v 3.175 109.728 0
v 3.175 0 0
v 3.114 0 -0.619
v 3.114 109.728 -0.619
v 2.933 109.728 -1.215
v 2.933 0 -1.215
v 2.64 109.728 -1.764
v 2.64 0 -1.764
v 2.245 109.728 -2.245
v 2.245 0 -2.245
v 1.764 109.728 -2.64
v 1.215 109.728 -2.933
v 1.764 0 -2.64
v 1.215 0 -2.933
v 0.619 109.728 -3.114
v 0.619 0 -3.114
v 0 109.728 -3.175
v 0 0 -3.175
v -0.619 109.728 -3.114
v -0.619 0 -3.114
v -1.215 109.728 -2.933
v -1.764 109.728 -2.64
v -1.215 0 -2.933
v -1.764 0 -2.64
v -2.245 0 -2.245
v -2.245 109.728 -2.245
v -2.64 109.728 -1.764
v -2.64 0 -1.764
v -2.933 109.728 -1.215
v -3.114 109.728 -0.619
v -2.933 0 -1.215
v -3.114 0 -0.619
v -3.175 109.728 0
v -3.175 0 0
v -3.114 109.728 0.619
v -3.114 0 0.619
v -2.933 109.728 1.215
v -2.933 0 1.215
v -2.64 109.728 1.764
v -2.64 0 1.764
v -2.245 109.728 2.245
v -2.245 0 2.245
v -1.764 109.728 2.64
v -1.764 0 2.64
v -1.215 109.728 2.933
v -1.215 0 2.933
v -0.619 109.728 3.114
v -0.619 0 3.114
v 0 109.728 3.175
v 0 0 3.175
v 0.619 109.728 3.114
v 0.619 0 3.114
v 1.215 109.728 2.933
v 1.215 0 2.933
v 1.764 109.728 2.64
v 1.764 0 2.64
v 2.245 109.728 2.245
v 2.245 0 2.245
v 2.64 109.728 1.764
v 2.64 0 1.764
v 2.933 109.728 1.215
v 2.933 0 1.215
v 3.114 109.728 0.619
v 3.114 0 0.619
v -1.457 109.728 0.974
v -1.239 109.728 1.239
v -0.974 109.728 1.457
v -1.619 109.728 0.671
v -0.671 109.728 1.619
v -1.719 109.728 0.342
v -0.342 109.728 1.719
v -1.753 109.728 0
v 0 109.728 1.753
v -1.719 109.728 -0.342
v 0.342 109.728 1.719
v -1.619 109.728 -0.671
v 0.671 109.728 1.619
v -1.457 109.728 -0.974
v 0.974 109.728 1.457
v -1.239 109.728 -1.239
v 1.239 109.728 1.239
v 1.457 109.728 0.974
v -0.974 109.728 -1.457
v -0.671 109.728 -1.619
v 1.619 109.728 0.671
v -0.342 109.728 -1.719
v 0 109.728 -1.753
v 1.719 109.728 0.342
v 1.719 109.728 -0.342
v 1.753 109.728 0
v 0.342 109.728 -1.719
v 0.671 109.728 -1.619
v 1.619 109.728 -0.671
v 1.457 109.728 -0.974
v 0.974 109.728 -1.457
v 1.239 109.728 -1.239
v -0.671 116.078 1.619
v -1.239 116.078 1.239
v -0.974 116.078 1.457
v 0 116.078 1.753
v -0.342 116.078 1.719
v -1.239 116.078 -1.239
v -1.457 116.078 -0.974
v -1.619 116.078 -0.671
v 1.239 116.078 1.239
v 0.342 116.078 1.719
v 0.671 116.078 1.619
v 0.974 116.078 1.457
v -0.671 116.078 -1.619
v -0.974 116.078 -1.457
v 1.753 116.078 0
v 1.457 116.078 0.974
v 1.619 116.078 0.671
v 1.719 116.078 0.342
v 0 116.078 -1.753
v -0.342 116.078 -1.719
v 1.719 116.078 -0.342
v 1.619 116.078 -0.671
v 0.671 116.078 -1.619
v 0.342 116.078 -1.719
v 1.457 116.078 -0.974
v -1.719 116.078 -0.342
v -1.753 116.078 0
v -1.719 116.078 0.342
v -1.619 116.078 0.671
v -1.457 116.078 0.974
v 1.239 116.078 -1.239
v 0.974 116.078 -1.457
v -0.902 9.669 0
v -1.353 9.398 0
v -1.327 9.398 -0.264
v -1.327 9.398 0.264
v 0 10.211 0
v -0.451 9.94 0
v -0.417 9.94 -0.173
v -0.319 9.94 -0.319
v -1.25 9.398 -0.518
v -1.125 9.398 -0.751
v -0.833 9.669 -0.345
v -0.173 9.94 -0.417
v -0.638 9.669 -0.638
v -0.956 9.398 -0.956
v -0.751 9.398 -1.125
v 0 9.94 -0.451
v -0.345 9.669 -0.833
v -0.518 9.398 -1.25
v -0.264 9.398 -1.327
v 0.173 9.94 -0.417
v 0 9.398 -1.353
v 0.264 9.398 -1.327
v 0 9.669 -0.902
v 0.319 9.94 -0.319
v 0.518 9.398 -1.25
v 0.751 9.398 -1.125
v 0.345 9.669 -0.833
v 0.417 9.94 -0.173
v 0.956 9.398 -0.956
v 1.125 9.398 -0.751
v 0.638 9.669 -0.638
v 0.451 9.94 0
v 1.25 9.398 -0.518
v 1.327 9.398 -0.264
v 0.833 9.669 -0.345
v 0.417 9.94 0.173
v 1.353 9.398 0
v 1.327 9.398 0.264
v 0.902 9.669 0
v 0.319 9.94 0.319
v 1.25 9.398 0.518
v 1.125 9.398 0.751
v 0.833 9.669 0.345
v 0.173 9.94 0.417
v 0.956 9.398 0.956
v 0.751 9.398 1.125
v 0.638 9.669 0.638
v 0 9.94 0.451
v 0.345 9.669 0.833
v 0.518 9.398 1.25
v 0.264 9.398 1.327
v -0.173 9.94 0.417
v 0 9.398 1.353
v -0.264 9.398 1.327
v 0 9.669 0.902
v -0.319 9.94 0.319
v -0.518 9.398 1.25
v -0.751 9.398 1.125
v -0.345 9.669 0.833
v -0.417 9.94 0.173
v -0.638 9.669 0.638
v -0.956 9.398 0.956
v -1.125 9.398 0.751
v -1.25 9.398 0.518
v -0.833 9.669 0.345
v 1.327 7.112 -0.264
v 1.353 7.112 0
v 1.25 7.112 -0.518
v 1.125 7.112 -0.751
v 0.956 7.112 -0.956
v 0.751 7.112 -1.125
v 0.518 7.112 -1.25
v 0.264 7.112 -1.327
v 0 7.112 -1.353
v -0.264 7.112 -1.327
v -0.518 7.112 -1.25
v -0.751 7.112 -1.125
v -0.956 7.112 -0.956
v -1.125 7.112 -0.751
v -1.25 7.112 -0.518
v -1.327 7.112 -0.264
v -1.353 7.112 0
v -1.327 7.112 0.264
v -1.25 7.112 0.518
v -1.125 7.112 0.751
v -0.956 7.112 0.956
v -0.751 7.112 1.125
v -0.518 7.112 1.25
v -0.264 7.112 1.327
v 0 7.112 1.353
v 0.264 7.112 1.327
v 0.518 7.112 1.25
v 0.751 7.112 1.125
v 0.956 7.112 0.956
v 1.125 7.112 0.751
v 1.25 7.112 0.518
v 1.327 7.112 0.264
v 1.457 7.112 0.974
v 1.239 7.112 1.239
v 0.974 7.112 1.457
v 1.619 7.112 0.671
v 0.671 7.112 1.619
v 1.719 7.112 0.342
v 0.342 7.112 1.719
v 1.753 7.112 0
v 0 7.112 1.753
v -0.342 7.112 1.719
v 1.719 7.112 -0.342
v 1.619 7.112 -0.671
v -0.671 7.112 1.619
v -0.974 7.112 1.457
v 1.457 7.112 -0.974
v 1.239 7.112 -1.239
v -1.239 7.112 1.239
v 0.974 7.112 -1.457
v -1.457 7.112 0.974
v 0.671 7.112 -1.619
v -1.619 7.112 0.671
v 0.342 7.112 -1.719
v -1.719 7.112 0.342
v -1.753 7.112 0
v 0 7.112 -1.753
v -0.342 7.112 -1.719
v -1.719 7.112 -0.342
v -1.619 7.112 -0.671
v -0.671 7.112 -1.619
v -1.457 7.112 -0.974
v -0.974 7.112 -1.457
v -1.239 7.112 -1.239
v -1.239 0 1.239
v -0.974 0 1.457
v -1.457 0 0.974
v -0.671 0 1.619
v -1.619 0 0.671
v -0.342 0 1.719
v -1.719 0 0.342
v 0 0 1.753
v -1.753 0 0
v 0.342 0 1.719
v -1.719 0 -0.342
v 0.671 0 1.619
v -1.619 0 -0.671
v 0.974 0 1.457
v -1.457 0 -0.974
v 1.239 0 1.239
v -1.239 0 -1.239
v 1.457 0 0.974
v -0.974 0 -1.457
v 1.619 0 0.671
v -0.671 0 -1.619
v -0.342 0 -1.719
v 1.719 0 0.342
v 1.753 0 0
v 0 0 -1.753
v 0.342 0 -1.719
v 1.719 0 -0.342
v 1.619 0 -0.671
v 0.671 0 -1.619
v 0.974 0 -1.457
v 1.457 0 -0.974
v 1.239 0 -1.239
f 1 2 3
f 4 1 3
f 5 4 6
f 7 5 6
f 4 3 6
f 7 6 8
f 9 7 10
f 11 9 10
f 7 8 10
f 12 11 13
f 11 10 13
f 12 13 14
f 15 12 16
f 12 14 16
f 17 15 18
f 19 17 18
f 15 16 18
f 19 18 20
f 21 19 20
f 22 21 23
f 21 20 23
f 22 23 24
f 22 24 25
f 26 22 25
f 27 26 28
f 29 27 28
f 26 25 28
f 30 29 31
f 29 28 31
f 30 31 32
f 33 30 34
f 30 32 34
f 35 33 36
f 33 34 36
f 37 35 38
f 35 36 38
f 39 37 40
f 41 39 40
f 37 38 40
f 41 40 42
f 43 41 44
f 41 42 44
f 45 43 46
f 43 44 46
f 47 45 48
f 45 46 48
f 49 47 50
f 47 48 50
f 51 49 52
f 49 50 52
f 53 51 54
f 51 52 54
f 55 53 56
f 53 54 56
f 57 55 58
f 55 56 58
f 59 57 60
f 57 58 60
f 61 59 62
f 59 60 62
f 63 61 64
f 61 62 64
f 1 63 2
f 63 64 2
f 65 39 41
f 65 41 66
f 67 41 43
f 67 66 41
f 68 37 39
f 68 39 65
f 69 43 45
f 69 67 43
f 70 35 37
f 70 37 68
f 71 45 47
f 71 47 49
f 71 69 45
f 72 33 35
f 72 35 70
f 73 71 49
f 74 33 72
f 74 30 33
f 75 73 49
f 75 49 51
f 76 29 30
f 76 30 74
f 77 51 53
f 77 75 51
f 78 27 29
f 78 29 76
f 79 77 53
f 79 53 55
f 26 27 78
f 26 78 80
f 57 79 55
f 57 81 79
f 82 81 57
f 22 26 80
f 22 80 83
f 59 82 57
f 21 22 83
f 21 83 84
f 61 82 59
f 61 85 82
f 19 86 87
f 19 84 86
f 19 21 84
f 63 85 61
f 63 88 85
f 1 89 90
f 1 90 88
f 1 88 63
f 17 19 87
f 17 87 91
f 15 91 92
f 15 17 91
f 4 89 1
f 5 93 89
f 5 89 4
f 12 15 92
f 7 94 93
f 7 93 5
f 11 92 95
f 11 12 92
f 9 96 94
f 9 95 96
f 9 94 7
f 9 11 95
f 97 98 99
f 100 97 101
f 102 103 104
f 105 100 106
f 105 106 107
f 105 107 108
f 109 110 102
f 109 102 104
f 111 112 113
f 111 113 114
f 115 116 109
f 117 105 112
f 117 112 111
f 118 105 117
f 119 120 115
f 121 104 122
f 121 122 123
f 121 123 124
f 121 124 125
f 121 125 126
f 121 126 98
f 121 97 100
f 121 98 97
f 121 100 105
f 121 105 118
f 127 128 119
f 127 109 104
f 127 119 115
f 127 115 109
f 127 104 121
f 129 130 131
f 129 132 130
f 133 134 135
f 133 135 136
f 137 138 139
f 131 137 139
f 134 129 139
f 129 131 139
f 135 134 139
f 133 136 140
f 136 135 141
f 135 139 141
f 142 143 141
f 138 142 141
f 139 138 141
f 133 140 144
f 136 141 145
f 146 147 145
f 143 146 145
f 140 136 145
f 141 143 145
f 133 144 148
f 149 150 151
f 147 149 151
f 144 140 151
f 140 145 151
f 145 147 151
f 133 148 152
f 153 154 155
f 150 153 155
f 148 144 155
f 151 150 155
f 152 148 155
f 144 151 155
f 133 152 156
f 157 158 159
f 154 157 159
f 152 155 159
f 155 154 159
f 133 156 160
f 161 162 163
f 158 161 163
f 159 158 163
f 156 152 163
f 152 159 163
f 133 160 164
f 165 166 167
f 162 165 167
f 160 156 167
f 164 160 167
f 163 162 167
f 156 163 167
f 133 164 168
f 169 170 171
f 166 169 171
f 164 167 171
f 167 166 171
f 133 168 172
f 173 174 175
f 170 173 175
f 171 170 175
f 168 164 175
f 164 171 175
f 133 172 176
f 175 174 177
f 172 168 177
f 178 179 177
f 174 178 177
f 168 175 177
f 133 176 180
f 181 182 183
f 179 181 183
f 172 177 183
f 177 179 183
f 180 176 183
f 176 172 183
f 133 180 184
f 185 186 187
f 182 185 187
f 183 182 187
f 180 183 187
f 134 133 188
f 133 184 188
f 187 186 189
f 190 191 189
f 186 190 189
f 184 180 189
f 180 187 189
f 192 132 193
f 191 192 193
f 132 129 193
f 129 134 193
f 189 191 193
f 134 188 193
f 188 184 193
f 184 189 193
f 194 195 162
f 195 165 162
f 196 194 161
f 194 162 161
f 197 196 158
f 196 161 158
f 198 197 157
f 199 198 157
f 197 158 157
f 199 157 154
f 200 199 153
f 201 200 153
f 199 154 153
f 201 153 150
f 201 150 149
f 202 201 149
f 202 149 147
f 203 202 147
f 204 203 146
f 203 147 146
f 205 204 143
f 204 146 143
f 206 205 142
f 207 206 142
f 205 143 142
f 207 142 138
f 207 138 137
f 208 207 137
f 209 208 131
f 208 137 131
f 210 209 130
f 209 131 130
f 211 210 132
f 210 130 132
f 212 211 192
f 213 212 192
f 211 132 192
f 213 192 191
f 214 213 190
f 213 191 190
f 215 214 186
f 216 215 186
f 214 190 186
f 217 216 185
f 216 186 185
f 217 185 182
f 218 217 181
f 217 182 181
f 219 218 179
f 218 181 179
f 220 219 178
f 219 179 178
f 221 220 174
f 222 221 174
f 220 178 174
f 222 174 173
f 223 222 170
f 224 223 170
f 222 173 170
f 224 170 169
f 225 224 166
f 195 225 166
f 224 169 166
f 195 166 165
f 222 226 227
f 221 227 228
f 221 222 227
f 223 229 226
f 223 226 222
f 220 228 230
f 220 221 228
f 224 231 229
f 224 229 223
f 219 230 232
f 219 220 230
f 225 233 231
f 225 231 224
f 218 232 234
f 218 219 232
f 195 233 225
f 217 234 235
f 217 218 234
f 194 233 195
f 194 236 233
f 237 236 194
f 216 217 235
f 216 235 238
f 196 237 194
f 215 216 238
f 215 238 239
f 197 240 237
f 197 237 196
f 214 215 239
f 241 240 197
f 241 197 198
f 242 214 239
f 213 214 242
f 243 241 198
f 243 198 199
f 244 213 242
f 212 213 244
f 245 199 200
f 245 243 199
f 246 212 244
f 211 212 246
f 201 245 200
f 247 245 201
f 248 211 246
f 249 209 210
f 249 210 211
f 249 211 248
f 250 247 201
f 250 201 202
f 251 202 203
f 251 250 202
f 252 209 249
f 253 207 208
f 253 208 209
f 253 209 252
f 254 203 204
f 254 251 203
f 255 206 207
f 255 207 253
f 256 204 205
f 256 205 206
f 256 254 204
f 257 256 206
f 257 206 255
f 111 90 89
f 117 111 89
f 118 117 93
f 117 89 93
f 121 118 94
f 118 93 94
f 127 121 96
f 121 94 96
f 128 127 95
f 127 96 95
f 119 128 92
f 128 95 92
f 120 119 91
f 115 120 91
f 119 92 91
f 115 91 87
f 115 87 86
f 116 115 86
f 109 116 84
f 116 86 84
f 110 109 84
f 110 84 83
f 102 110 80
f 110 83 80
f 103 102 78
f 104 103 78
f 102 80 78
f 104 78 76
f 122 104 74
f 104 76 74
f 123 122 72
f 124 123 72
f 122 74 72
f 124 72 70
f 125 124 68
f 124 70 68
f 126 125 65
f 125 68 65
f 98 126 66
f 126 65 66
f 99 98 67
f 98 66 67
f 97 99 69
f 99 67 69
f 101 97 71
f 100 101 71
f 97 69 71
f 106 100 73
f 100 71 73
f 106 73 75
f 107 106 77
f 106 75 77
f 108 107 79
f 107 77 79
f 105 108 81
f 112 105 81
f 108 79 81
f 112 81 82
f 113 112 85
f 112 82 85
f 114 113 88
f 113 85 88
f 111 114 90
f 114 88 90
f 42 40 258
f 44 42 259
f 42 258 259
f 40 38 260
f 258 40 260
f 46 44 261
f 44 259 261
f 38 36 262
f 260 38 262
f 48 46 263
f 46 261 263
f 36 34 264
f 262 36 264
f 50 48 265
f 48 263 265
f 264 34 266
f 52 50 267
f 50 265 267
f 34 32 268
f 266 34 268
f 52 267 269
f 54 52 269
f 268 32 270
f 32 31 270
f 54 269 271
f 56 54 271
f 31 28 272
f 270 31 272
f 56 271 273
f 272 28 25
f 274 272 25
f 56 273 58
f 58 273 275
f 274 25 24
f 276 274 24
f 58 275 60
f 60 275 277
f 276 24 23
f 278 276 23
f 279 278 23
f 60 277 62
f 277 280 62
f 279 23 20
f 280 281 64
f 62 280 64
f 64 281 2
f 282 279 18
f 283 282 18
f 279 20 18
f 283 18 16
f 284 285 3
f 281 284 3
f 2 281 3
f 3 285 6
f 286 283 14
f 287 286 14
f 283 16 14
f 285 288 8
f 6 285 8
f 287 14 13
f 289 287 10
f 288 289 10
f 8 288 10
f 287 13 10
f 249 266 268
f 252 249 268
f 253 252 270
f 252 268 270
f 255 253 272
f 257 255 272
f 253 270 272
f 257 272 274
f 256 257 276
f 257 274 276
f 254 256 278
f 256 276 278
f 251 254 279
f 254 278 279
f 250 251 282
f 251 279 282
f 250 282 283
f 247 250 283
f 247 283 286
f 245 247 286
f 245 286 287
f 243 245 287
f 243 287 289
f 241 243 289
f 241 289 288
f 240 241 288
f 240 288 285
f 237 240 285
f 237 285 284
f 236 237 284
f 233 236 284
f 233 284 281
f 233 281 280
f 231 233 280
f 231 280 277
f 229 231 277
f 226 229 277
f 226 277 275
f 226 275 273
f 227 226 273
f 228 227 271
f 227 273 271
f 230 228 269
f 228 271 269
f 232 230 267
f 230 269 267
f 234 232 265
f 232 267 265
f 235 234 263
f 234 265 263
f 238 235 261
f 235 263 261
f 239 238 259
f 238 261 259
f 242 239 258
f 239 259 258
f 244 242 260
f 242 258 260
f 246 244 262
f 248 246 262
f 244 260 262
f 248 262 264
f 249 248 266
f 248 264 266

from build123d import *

# Parameters (mm, degrees)
SKETCH1_R                       = 3.175
BOSS_EXTRUDE1_DEPTH             = 109.728
F_6_32_TAPPED_HOLE1_D           = 2.7051
F_6_32_TAPPED_HOLE1_DEPTH       = 9.398
F_6_32_TAPPED_HOLE1_CBORE_D     = 3.5052
F_6_32_TAPPED_HOLE1_CBORE_DEPTH = 7.112
F_6_32_TAPPED_HOLE1_TIP         = 0.81269403
SKETCH4_R                       = 1.7526
BOSS_EXTRUDE2_DEPTH             = 6.35


with BuildPart() as part:
    # Sketch1 → Boss-Extrude1 (new body)
    with BuildSketch(Plane(origin=(0, 0, 0), x_dir=(1, 0, 0), z_dir=(0, 1, 0))):
        Circle(SKETCH1_R)
    extrude(amount=BOSS_EXTRUDE1_DEPTH)

    # #6-32 Tapped Hole1
    with Locations(Plane(origin=(0, 0, 0), x_dir=(-1, 0, 0), z_dir=(0, -1, 0))):
        with Locations((0, 0)):
            CounterBoreHole(F_6_32_TAPPED_HOLE1_D / 2, F_6_32_TAPPED_HOLE1_CBORE_D / 2, F_6_32_TAPPED_HOLE1_CBORE_DEPTH, depth=F_6_32_TAPPED_HOLE1_DEPTH)
            with Locations((0, 0, -(F_6_32_TAPPED_HOLE1_DEPTH + F_6_32_TAPPED_HOLE1_TIP / 2))):  # 118° drill point
                Cone(0, F_6_32_TAPPED_HOLE1_D / 2, F_6_32_TAPPED_HOLE1_TIP, mode=Mode.SUBTRACT)

    # Sketch4 → Boss-Extrude2 (add)
    with BuildSketch(Plane(origin=(0, 109.728, 0), x_dir=(1, 0, 0), z_dir=(0, 1, 0))):
        Circle(SKETCH4_R)
    extrude(amount=BOSS_EXTRUDE2_DEPTH)


solid = part.part
